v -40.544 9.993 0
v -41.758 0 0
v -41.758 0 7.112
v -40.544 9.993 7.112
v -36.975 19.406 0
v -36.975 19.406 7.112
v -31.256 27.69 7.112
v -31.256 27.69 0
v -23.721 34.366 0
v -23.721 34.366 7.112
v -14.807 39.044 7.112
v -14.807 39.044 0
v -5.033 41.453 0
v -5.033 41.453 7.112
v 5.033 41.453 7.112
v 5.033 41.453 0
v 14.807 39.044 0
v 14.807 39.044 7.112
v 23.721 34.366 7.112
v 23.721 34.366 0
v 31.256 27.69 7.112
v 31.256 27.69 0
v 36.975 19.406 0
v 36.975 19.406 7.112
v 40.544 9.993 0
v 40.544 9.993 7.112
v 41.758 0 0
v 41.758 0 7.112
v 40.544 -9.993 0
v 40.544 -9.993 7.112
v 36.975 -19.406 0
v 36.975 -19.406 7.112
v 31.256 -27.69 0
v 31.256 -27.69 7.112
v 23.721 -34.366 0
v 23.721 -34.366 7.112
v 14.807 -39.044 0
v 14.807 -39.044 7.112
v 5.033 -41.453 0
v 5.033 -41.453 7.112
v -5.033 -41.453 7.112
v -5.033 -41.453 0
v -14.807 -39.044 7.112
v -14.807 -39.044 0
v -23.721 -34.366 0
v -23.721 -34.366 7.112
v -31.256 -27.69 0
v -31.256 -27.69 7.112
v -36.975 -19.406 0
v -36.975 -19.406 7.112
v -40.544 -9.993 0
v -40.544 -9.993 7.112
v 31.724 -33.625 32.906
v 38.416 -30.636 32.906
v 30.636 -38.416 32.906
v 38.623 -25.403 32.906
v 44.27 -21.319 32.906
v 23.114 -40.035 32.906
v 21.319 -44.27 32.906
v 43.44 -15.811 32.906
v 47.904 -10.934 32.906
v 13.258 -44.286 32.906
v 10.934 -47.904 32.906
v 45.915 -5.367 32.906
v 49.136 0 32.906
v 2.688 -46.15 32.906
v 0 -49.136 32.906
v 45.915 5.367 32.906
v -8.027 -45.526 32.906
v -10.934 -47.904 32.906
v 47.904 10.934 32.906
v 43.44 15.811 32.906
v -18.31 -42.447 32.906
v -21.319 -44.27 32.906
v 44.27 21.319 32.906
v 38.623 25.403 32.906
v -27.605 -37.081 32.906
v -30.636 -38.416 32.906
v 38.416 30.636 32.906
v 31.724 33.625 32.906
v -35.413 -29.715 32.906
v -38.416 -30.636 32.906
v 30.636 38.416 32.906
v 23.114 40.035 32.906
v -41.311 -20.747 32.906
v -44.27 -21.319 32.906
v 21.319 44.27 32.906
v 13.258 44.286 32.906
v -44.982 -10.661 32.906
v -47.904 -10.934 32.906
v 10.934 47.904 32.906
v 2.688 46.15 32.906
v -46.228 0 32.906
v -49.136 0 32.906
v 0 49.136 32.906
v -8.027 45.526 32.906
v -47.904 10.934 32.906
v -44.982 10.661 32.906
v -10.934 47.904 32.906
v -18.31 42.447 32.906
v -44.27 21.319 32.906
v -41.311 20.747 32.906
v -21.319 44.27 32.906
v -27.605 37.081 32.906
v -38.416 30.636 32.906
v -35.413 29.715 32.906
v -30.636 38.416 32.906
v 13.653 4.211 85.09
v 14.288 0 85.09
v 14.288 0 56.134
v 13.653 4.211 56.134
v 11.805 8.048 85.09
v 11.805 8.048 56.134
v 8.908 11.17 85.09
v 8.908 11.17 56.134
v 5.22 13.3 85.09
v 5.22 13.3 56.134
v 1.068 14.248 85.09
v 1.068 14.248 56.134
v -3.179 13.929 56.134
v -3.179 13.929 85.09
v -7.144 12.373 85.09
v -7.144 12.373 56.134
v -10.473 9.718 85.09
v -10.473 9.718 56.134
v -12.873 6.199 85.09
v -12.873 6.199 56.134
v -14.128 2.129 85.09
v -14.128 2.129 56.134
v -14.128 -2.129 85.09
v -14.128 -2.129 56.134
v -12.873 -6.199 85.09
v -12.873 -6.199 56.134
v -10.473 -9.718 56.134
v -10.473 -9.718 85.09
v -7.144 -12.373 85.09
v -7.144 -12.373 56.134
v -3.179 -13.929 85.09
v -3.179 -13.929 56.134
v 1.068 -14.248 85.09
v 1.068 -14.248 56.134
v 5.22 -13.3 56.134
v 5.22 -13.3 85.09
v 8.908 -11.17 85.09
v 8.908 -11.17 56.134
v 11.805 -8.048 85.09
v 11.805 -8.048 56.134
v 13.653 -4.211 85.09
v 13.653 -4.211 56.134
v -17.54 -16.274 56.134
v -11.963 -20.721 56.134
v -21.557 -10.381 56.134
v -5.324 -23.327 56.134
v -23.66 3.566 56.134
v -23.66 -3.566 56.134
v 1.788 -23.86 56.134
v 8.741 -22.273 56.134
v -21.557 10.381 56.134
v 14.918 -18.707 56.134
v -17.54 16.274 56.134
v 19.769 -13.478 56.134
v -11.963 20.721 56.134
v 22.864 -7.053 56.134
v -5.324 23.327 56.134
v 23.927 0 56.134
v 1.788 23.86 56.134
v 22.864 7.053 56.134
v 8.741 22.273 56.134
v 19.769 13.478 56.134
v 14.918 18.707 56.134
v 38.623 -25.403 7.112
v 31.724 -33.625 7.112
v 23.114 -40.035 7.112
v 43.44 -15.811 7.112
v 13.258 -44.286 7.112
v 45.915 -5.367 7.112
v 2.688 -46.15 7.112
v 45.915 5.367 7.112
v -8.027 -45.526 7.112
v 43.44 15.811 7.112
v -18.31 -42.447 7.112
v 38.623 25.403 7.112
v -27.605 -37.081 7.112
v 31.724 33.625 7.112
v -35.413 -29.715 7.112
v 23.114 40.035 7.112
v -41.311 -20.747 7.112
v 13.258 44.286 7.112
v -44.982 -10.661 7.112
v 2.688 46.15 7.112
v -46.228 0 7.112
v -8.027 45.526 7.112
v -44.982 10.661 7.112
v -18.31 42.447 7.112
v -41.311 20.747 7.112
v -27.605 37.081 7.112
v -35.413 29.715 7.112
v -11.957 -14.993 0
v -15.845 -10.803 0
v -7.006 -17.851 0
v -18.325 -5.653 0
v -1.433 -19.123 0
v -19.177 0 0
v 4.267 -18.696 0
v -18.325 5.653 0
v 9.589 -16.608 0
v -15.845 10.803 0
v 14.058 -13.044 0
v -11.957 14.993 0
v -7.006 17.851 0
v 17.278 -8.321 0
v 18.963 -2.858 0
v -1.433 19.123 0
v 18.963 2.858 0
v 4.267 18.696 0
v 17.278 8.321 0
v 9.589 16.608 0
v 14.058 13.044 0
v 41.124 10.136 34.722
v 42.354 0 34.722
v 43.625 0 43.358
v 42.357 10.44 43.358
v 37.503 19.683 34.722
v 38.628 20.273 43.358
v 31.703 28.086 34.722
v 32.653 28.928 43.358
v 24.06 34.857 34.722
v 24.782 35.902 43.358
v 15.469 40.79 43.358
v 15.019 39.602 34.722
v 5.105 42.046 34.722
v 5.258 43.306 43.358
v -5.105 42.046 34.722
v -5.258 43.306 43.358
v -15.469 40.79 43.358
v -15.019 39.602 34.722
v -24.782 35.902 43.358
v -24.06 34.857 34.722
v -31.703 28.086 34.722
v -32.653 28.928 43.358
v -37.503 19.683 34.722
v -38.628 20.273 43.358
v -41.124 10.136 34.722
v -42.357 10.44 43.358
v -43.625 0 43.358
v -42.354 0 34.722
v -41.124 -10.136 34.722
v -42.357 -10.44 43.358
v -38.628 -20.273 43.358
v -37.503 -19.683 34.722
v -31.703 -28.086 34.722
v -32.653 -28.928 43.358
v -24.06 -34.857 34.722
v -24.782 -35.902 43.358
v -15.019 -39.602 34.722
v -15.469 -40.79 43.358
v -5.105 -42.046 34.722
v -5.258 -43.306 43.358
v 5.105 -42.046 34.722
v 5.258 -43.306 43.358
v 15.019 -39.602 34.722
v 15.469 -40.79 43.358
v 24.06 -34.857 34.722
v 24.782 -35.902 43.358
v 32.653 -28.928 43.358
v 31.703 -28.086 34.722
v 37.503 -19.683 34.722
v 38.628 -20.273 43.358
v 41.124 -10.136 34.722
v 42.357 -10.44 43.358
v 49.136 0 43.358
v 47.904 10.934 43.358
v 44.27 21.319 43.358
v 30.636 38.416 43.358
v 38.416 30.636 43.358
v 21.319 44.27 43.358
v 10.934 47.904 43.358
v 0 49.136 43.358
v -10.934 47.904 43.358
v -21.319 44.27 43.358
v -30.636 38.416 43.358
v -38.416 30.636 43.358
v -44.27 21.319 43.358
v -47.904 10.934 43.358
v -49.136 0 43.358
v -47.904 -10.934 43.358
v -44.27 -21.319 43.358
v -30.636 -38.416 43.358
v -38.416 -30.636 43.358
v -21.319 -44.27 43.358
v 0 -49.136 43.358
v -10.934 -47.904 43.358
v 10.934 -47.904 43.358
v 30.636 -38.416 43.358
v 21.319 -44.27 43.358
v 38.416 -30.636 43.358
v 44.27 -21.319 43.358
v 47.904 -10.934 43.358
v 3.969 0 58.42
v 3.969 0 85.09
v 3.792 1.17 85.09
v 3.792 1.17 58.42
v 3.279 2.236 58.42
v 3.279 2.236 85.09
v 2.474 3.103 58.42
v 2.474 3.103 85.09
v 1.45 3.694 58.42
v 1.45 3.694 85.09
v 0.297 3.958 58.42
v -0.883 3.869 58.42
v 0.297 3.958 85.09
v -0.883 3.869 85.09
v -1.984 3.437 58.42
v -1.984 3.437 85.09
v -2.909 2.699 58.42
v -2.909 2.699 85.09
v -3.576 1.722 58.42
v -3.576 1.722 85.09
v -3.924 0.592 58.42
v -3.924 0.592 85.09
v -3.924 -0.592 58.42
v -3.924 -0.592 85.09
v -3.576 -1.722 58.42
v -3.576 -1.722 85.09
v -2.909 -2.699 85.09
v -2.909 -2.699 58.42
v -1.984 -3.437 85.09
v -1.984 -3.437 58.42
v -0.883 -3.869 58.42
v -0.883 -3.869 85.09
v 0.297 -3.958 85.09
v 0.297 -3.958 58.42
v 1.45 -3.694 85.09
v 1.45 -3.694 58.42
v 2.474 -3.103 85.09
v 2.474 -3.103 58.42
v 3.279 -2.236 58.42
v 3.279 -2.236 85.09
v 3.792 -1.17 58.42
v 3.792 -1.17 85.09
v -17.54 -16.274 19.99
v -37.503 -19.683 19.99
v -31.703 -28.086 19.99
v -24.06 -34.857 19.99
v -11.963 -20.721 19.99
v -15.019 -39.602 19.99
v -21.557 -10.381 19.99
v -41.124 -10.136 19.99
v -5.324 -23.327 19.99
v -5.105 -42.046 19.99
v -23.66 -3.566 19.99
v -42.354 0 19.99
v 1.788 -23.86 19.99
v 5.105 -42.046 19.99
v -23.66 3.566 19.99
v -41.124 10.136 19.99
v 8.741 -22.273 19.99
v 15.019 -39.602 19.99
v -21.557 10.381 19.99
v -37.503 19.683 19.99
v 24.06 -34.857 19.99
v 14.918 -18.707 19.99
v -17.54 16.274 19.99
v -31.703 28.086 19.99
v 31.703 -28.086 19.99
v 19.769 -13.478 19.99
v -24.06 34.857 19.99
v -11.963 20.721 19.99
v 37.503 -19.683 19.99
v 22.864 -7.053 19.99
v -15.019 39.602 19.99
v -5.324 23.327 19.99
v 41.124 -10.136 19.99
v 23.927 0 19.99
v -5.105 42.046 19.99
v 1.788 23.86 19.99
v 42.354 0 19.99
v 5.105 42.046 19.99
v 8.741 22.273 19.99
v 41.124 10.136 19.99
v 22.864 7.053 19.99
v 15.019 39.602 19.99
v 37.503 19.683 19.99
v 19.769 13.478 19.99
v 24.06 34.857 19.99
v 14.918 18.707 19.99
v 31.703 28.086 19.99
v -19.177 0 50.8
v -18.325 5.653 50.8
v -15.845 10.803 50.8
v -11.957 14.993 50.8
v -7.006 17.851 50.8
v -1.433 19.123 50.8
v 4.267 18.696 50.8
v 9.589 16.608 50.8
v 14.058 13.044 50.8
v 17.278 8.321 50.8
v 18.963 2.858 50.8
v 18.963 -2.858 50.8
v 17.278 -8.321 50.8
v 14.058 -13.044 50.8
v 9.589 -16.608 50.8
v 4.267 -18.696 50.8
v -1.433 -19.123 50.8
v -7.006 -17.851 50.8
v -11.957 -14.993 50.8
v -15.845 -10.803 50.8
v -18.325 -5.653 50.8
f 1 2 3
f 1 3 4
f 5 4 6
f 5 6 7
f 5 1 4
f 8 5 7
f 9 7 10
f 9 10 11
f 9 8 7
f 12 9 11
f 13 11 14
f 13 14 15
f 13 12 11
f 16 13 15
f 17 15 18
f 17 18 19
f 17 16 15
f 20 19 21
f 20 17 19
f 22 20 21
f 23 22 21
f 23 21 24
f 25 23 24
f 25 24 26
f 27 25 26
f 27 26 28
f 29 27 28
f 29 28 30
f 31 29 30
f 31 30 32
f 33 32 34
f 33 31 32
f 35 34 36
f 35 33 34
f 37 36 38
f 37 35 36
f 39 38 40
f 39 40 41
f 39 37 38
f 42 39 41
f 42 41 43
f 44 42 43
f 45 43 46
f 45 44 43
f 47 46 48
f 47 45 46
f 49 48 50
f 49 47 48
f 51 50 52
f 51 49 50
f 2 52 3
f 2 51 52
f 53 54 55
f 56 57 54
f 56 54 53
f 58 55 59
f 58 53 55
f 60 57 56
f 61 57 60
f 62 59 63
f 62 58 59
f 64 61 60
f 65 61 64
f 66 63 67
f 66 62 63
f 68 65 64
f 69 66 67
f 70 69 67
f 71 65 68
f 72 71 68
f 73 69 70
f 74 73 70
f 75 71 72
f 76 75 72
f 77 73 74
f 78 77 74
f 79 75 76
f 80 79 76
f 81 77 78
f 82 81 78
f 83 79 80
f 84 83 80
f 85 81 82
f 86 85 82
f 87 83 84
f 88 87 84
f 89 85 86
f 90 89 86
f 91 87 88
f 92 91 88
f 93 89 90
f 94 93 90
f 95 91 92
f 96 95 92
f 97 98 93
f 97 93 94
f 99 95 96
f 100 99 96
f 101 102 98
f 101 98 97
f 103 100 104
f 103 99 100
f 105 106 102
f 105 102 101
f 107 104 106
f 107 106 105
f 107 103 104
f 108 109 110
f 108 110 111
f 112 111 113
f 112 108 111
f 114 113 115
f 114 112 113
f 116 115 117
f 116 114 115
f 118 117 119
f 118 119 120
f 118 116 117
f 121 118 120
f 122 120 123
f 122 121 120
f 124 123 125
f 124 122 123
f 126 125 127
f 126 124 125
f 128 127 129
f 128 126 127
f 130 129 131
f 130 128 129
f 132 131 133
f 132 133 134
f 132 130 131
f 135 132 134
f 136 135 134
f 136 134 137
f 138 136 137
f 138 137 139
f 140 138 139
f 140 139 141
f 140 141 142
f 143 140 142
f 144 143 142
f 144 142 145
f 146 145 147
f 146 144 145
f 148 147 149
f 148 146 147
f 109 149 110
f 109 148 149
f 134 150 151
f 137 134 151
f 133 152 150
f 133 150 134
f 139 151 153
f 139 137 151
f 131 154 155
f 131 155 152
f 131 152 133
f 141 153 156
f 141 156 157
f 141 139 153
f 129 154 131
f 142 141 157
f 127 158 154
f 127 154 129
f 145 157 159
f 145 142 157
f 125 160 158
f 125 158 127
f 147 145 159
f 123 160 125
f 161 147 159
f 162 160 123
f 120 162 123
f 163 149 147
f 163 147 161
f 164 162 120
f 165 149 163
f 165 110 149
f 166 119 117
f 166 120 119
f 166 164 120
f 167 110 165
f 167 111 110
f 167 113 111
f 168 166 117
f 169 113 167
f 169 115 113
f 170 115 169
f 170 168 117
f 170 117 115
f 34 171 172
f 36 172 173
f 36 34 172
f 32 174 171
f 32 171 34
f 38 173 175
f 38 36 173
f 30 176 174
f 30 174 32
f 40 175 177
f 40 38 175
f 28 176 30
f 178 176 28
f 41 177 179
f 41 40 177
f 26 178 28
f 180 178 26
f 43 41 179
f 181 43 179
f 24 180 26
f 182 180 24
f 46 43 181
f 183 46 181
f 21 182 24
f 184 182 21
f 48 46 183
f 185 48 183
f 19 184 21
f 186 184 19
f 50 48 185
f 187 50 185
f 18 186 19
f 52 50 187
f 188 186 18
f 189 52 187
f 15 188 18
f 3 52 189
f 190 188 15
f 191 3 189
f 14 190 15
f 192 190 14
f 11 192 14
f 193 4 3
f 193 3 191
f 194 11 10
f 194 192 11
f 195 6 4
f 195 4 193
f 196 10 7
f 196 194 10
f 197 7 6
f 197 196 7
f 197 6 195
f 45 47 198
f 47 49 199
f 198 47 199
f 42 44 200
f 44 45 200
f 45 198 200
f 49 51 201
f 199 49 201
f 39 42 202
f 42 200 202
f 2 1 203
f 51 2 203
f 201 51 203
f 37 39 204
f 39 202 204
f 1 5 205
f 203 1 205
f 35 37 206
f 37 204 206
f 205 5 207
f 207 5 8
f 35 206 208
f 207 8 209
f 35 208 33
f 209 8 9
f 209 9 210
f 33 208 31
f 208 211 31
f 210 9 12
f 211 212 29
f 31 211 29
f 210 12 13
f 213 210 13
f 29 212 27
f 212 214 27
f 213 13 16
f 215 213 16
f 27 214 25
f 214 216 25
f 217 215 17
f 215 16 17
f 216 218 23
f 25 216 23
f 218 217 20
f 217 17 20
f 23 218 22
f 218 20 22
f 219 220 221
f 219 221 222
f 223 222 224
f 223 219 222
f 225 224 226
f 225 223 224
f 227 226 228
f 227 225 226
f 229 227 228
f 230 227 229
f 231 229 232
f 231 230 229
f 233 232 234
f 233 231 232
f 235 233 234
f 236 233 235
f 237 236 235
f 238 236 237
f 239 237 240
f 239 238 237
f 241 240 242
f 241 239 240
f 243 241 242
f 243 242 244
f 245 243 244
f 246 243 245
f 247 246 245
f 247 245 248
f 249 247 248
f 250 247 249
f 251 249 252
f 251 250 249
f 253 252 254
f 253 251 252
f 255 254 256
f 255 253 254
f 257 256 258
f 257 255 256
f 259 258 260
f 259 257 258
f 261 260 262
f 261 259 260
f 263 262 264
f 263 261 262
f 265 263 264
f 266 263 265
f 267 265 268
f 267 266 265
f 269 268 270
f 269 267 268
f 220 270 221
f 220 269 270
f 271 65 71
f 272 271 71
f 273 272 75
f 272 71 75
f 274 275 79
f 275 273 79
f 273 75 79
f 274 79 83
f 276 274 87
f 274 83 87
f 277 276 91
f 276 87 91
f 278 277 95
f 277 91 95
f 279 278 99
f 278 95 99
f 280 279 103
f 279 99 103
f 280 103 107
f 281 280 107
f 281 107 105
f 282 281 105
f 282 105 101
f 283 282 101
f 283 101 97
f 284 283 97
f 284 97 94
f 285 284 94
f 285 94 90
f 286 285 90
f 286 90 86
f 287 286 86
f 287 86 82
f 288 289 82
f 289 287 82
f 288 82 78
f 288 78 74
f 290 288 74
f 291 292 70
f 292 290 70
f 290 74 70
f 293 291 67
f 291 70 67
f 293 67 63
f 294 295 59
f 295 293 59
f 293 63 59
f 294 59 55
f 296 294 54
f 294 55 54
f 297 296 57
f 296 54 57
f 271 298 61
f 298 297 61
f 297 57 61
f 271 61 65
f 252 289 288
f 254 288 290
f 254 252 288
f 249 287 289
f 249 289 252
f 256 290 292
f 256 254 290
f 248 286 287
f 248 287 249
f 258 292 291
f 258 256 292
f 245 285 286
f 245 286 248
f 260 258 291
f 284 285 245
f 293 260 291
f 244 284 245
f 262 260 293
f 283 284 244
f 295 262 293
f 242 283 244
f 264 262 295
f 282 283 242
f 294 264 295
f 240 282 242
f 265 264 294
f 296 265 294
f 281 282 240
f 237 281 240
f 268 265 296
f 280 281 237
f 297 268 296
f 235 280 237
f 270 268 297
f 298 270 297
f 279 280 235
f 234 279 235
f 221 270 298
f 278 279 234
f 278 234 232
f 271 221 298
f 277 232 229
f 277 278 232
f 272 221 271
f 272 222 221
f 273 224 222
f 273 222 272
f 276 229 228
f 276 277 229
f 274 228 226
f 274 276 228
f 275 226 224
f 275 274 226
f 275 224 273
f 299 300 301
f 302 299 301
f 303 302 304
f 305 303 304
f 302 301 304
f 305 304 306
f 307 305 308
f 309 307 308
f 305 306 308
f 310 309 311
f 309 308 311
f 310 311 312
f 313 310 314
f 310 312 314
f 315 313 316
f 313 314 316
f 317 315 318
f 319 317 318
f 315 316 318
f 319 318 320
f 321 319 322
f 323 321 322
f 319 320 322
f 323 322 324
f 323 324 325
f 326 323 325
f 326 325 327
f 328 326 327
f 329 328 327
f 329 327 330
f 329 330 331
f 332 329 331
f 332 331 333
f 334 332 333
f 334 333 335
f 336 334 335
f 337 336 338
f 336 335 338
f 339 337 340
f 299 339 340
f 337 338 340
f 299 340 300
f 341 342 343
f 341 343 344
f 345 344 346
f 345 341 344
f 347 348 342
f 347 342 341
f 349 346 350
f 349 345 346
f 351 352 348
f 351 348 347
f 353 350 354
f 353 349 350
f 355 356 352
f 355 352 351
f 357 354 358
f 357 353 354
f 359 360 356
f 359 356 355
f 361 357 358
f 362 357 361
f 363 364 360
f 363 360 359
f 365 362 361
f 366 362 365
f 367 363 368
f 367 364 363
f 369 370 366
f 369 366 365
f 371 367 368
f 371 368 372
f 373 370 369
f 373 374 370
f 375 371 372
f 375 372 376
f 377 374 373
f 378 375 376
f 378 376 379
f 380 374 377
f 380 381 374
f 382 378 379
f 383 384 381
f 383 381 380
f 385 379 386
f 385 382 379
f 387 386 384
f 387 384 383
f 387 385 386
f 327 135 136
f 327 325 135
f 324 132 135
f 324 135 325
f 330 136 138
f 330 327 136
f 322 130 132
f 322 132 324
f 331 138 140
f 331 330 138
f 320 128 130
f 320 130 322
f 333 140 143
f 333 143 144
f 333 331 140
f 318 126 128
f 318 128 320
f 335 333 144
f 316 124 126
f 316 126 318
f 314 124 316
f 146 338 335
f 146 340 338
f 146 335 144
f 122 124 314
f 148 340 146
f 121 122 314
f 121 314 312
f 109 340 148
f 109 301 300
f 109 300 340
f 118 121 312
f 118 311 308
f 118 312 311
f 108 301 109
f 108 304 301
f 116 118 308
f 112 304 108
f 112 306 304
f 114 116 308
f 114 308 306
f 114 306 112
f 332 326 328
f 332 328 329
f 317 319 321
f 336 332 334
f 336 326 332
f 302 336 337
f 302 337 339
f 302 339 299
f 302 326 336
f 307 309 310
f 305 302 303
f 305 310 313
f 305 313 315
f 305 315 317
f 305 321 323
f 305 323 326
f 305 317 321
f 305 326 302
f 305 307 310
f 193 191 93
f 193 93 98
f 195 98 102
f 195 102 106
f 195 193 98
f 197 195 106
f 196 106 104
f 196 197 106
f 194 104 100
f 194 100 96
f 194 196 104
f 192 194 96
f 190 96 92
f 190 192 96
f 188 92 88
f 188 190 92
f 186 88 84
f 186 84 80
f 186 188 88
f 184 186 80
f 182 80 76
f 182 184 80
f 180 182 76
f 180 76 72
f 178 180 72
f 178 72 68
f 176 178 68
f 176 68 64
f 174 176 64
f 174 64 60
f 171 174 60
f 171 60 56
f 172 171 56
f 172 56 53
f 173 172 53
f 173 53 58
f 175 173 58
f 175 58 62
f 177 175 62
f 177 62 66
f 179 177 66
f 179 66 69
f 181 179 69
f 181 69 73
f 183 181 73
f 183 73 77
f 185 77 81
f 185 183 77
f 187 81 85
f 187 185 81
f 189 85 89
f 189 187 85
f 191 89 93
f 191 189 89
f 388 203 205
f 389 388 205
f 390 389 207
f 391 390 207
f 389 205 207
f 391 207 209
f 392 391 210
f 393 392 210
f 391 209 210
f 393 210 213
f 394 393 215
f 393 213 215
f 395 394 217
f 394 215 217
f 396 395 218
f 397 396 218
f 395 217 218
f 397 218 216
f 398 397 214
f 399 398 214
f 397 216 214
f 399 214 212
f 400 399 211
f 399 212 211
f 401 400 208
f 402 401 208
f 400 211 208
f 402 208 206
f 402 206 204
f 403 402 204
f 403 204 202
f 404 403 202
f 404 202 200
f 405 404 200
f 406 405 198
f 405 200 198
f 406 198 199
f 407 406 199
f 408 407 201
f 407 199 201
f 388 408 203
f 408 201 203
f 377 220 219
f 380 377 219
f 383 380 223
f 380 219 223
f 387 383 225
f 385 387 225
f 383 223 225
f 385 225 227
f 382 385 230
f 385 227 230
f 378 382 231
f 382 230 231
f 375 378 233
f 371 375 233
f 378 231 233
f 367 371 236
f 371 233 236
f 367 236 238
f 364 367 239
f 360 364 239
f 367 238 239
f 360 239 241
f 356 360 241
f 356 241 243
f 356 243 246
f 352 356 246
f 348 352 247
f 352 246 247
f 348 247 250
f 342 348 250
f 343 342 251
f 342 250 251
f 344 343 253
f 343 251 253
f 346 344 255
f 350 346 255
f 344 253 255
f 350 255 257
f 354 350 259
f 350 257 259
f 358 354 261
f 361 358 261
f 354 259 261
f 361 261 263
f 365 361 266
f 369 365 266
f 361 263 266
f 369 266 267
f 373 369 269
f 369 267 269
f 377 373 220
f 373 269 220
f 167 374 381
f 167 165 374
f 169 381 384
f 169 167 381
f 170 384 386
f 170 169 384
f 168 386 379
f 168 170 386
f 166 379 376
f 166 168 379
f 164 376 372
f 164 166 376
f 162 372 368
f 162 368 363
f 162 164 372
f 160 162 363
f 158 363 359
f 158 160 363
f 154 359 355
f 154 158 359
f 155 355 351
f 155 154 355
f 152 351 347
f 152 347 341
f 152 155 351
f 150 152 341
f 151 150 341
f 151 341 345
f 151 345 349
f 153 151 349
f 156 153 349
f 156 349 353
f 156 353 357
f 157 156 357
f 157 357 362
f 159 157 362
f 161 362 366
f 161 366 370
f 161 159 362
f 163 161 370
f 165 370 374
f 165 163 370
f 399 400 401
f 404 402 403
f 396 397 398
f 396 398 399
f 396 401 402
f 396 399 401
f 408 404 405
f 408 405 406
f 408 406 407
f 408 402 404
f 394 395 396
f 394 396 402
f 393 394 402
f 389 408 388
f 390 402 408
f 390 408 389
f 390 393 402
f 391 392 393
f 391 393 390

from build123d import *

# Parameters (mm, degrees)
SKETCH1_R         = 49.1363
EXTRUDE1_DEPTH    = 85.09
SKETCH5_R         = 3.96875
EXTRUDE5_DEPTH    = 26.67
SKETCH2_OUTSIDE_W = 132.864
SKETCH2_OUTSIDE_H = 132.864
SKETCH2_OUTSIDE_R = 14.2875
EXTRUDE2_DEPTH    = 28.956
SKETCH3_OUTSIDE_W = 132.864
SKETCH3_OUTSIDE_H = 132.864
SKETCH3_OUTSIDE_R = 23.9268
EXTRUDE3_DEPTH    = 12.7762
SKETCH4_OUTSIDE_W = 132.864
SKETCH4_OUTSIDE_H = 132.864
SKETCH4_OUTSIDE_R = 46.228
EXTRUDE4_DEPTH    = 32.9057
SKETCH6_R         = 42.3545
SKETCH6_R_2       = 23.9268
EXTRUDE8_DEPTH    = 23.368
SKETCH7_R         = 19.177
EXTRUDE9_DEPTH    = 50.8
SKETCH8_OUTSIDE_W = 132.864
SKETCH8_OUTSIDE_H = 132.864
SKETCH8_OUTSIDE_R = 41.7576
EXTRUDE10_DEPTH   = 7.112
CHAMFER1_SIZE     = 1.27
CHAMFER1_SIZE2    = 8.636


with BuildPart() as part:
    # Sketch1 → Extrude1 (new body)
    with BuildSketch(Plane.XY):
        Circle(SKETCH1_R)
    extrude(amount=EXTRUDE1_DEPTH)

    # Sketch5 → Extrude5 (cut)
    with BuildSketch(Plane.XY.offset(85.09)):
        Circle(SKETCH5_R)
    extrude(amount=-EXTRUDE5_DEPTH, mode=Mode.SUBTRACT)

    # Sketch2 outside → Extrude2 (cut)
    with BuildSketch(Plane.XY.offset(85.09)):
        Rectangle(SKETCH2_OUTSIDE_W, SKETCH2_OUTSIDE_H)
        Circle(SKETCH2_OUTSIDE_R, mode=Mode.SUBTRACT)
    extrude(amount=-EXTRUDE2_DEPTH, mode=Mode.SUBTRACT)

    # Sketch3 outside → Extrude3 (cut)
    with BuildSketch(Plane.XY.offset(56.134)):
        Rectangle(SKETCH3_OUTSIDE_W, SKETCH3_OUTSIDE_H)
        Circle(SKETCH3_OUTSIDE_R, mode=Mode.SUBTRACT)
    extrude(amount=-EXTRUDE3_DEPTH, mode=Mode.SUBTRACT)

    # Sketch4 outside → Extrude4 (cut)
    with BuildSketch(Plane(origin=(0, 0, 0), x_dir=(-1, 0, 0), z_dir=(0, 0, -1))):
        Rectangle(SKETCH4_OUTSIDE_W, SKETCH4_OUTSIDE_H)
        Circle(SKETCH4_OUTSIDE_R, mode=Mode.SUBTRACT)
    extrude(amount=-EXTRUDE4_DEPTH, mode=Mode.SUBTRACT)

    # Sketch6 → Extrude8 (cut)
    with BuildSketch(Plane.XY.offset(43.3578)):
        Circle(SKETCH6_R)
        Circle(SKETCH6_R_2, mode=Mode.SUBTRACT)
    extrude(amount=-EXTRUDE8_DEPTH, mode=Mode.SUBTRACT)

    # Sketch7 → Extrude9 (cut)
    with BuildSketch(Plane(origin=(0, 0, 0), x_dir=(-1, 0, 0), z_dir=(0, 0, -1))):
        Circle(SKETCH7_R)
    extrude(amount=-EXTRUDE9_DEPTH, mode=Mode.SUBTRACT)

    # Sketch8 outside → Extrude10 (cut)
    with BuildSketch(Plane(origin=(0, 0, 0), x_dir=(-1, 0, 0), z_dir=(0, 0, -1))):
        Rectangle(SKETCH8_OUTSIDE_W, SKETCH8_OUTSIDE_H)
        Circle(SKETCH8_OUTSIDE_R, mode=Mode.SUBTRACT)
    extrude(amount=-EXTRUDE10_DEPTH, mode=Mode.SUBTRACT)

    # Chamfer1
    chamfer1_edges = [part.edges().sort_by_distance(p)[0] for p in [
        (-42.3545, 0, 43.3578),
    ]]
    chamfer1_side = [part.faces().sort_by_distance(p)[0] for p in [
        (-47.746515563, 0, 43.3578),
    ]]
    chamfer(chamfer1_edges, length=CHAMFER1_SIZE, length2=CHAMFER1_SIZE2, reference=chamfer1_side[0])


solid = part.part
